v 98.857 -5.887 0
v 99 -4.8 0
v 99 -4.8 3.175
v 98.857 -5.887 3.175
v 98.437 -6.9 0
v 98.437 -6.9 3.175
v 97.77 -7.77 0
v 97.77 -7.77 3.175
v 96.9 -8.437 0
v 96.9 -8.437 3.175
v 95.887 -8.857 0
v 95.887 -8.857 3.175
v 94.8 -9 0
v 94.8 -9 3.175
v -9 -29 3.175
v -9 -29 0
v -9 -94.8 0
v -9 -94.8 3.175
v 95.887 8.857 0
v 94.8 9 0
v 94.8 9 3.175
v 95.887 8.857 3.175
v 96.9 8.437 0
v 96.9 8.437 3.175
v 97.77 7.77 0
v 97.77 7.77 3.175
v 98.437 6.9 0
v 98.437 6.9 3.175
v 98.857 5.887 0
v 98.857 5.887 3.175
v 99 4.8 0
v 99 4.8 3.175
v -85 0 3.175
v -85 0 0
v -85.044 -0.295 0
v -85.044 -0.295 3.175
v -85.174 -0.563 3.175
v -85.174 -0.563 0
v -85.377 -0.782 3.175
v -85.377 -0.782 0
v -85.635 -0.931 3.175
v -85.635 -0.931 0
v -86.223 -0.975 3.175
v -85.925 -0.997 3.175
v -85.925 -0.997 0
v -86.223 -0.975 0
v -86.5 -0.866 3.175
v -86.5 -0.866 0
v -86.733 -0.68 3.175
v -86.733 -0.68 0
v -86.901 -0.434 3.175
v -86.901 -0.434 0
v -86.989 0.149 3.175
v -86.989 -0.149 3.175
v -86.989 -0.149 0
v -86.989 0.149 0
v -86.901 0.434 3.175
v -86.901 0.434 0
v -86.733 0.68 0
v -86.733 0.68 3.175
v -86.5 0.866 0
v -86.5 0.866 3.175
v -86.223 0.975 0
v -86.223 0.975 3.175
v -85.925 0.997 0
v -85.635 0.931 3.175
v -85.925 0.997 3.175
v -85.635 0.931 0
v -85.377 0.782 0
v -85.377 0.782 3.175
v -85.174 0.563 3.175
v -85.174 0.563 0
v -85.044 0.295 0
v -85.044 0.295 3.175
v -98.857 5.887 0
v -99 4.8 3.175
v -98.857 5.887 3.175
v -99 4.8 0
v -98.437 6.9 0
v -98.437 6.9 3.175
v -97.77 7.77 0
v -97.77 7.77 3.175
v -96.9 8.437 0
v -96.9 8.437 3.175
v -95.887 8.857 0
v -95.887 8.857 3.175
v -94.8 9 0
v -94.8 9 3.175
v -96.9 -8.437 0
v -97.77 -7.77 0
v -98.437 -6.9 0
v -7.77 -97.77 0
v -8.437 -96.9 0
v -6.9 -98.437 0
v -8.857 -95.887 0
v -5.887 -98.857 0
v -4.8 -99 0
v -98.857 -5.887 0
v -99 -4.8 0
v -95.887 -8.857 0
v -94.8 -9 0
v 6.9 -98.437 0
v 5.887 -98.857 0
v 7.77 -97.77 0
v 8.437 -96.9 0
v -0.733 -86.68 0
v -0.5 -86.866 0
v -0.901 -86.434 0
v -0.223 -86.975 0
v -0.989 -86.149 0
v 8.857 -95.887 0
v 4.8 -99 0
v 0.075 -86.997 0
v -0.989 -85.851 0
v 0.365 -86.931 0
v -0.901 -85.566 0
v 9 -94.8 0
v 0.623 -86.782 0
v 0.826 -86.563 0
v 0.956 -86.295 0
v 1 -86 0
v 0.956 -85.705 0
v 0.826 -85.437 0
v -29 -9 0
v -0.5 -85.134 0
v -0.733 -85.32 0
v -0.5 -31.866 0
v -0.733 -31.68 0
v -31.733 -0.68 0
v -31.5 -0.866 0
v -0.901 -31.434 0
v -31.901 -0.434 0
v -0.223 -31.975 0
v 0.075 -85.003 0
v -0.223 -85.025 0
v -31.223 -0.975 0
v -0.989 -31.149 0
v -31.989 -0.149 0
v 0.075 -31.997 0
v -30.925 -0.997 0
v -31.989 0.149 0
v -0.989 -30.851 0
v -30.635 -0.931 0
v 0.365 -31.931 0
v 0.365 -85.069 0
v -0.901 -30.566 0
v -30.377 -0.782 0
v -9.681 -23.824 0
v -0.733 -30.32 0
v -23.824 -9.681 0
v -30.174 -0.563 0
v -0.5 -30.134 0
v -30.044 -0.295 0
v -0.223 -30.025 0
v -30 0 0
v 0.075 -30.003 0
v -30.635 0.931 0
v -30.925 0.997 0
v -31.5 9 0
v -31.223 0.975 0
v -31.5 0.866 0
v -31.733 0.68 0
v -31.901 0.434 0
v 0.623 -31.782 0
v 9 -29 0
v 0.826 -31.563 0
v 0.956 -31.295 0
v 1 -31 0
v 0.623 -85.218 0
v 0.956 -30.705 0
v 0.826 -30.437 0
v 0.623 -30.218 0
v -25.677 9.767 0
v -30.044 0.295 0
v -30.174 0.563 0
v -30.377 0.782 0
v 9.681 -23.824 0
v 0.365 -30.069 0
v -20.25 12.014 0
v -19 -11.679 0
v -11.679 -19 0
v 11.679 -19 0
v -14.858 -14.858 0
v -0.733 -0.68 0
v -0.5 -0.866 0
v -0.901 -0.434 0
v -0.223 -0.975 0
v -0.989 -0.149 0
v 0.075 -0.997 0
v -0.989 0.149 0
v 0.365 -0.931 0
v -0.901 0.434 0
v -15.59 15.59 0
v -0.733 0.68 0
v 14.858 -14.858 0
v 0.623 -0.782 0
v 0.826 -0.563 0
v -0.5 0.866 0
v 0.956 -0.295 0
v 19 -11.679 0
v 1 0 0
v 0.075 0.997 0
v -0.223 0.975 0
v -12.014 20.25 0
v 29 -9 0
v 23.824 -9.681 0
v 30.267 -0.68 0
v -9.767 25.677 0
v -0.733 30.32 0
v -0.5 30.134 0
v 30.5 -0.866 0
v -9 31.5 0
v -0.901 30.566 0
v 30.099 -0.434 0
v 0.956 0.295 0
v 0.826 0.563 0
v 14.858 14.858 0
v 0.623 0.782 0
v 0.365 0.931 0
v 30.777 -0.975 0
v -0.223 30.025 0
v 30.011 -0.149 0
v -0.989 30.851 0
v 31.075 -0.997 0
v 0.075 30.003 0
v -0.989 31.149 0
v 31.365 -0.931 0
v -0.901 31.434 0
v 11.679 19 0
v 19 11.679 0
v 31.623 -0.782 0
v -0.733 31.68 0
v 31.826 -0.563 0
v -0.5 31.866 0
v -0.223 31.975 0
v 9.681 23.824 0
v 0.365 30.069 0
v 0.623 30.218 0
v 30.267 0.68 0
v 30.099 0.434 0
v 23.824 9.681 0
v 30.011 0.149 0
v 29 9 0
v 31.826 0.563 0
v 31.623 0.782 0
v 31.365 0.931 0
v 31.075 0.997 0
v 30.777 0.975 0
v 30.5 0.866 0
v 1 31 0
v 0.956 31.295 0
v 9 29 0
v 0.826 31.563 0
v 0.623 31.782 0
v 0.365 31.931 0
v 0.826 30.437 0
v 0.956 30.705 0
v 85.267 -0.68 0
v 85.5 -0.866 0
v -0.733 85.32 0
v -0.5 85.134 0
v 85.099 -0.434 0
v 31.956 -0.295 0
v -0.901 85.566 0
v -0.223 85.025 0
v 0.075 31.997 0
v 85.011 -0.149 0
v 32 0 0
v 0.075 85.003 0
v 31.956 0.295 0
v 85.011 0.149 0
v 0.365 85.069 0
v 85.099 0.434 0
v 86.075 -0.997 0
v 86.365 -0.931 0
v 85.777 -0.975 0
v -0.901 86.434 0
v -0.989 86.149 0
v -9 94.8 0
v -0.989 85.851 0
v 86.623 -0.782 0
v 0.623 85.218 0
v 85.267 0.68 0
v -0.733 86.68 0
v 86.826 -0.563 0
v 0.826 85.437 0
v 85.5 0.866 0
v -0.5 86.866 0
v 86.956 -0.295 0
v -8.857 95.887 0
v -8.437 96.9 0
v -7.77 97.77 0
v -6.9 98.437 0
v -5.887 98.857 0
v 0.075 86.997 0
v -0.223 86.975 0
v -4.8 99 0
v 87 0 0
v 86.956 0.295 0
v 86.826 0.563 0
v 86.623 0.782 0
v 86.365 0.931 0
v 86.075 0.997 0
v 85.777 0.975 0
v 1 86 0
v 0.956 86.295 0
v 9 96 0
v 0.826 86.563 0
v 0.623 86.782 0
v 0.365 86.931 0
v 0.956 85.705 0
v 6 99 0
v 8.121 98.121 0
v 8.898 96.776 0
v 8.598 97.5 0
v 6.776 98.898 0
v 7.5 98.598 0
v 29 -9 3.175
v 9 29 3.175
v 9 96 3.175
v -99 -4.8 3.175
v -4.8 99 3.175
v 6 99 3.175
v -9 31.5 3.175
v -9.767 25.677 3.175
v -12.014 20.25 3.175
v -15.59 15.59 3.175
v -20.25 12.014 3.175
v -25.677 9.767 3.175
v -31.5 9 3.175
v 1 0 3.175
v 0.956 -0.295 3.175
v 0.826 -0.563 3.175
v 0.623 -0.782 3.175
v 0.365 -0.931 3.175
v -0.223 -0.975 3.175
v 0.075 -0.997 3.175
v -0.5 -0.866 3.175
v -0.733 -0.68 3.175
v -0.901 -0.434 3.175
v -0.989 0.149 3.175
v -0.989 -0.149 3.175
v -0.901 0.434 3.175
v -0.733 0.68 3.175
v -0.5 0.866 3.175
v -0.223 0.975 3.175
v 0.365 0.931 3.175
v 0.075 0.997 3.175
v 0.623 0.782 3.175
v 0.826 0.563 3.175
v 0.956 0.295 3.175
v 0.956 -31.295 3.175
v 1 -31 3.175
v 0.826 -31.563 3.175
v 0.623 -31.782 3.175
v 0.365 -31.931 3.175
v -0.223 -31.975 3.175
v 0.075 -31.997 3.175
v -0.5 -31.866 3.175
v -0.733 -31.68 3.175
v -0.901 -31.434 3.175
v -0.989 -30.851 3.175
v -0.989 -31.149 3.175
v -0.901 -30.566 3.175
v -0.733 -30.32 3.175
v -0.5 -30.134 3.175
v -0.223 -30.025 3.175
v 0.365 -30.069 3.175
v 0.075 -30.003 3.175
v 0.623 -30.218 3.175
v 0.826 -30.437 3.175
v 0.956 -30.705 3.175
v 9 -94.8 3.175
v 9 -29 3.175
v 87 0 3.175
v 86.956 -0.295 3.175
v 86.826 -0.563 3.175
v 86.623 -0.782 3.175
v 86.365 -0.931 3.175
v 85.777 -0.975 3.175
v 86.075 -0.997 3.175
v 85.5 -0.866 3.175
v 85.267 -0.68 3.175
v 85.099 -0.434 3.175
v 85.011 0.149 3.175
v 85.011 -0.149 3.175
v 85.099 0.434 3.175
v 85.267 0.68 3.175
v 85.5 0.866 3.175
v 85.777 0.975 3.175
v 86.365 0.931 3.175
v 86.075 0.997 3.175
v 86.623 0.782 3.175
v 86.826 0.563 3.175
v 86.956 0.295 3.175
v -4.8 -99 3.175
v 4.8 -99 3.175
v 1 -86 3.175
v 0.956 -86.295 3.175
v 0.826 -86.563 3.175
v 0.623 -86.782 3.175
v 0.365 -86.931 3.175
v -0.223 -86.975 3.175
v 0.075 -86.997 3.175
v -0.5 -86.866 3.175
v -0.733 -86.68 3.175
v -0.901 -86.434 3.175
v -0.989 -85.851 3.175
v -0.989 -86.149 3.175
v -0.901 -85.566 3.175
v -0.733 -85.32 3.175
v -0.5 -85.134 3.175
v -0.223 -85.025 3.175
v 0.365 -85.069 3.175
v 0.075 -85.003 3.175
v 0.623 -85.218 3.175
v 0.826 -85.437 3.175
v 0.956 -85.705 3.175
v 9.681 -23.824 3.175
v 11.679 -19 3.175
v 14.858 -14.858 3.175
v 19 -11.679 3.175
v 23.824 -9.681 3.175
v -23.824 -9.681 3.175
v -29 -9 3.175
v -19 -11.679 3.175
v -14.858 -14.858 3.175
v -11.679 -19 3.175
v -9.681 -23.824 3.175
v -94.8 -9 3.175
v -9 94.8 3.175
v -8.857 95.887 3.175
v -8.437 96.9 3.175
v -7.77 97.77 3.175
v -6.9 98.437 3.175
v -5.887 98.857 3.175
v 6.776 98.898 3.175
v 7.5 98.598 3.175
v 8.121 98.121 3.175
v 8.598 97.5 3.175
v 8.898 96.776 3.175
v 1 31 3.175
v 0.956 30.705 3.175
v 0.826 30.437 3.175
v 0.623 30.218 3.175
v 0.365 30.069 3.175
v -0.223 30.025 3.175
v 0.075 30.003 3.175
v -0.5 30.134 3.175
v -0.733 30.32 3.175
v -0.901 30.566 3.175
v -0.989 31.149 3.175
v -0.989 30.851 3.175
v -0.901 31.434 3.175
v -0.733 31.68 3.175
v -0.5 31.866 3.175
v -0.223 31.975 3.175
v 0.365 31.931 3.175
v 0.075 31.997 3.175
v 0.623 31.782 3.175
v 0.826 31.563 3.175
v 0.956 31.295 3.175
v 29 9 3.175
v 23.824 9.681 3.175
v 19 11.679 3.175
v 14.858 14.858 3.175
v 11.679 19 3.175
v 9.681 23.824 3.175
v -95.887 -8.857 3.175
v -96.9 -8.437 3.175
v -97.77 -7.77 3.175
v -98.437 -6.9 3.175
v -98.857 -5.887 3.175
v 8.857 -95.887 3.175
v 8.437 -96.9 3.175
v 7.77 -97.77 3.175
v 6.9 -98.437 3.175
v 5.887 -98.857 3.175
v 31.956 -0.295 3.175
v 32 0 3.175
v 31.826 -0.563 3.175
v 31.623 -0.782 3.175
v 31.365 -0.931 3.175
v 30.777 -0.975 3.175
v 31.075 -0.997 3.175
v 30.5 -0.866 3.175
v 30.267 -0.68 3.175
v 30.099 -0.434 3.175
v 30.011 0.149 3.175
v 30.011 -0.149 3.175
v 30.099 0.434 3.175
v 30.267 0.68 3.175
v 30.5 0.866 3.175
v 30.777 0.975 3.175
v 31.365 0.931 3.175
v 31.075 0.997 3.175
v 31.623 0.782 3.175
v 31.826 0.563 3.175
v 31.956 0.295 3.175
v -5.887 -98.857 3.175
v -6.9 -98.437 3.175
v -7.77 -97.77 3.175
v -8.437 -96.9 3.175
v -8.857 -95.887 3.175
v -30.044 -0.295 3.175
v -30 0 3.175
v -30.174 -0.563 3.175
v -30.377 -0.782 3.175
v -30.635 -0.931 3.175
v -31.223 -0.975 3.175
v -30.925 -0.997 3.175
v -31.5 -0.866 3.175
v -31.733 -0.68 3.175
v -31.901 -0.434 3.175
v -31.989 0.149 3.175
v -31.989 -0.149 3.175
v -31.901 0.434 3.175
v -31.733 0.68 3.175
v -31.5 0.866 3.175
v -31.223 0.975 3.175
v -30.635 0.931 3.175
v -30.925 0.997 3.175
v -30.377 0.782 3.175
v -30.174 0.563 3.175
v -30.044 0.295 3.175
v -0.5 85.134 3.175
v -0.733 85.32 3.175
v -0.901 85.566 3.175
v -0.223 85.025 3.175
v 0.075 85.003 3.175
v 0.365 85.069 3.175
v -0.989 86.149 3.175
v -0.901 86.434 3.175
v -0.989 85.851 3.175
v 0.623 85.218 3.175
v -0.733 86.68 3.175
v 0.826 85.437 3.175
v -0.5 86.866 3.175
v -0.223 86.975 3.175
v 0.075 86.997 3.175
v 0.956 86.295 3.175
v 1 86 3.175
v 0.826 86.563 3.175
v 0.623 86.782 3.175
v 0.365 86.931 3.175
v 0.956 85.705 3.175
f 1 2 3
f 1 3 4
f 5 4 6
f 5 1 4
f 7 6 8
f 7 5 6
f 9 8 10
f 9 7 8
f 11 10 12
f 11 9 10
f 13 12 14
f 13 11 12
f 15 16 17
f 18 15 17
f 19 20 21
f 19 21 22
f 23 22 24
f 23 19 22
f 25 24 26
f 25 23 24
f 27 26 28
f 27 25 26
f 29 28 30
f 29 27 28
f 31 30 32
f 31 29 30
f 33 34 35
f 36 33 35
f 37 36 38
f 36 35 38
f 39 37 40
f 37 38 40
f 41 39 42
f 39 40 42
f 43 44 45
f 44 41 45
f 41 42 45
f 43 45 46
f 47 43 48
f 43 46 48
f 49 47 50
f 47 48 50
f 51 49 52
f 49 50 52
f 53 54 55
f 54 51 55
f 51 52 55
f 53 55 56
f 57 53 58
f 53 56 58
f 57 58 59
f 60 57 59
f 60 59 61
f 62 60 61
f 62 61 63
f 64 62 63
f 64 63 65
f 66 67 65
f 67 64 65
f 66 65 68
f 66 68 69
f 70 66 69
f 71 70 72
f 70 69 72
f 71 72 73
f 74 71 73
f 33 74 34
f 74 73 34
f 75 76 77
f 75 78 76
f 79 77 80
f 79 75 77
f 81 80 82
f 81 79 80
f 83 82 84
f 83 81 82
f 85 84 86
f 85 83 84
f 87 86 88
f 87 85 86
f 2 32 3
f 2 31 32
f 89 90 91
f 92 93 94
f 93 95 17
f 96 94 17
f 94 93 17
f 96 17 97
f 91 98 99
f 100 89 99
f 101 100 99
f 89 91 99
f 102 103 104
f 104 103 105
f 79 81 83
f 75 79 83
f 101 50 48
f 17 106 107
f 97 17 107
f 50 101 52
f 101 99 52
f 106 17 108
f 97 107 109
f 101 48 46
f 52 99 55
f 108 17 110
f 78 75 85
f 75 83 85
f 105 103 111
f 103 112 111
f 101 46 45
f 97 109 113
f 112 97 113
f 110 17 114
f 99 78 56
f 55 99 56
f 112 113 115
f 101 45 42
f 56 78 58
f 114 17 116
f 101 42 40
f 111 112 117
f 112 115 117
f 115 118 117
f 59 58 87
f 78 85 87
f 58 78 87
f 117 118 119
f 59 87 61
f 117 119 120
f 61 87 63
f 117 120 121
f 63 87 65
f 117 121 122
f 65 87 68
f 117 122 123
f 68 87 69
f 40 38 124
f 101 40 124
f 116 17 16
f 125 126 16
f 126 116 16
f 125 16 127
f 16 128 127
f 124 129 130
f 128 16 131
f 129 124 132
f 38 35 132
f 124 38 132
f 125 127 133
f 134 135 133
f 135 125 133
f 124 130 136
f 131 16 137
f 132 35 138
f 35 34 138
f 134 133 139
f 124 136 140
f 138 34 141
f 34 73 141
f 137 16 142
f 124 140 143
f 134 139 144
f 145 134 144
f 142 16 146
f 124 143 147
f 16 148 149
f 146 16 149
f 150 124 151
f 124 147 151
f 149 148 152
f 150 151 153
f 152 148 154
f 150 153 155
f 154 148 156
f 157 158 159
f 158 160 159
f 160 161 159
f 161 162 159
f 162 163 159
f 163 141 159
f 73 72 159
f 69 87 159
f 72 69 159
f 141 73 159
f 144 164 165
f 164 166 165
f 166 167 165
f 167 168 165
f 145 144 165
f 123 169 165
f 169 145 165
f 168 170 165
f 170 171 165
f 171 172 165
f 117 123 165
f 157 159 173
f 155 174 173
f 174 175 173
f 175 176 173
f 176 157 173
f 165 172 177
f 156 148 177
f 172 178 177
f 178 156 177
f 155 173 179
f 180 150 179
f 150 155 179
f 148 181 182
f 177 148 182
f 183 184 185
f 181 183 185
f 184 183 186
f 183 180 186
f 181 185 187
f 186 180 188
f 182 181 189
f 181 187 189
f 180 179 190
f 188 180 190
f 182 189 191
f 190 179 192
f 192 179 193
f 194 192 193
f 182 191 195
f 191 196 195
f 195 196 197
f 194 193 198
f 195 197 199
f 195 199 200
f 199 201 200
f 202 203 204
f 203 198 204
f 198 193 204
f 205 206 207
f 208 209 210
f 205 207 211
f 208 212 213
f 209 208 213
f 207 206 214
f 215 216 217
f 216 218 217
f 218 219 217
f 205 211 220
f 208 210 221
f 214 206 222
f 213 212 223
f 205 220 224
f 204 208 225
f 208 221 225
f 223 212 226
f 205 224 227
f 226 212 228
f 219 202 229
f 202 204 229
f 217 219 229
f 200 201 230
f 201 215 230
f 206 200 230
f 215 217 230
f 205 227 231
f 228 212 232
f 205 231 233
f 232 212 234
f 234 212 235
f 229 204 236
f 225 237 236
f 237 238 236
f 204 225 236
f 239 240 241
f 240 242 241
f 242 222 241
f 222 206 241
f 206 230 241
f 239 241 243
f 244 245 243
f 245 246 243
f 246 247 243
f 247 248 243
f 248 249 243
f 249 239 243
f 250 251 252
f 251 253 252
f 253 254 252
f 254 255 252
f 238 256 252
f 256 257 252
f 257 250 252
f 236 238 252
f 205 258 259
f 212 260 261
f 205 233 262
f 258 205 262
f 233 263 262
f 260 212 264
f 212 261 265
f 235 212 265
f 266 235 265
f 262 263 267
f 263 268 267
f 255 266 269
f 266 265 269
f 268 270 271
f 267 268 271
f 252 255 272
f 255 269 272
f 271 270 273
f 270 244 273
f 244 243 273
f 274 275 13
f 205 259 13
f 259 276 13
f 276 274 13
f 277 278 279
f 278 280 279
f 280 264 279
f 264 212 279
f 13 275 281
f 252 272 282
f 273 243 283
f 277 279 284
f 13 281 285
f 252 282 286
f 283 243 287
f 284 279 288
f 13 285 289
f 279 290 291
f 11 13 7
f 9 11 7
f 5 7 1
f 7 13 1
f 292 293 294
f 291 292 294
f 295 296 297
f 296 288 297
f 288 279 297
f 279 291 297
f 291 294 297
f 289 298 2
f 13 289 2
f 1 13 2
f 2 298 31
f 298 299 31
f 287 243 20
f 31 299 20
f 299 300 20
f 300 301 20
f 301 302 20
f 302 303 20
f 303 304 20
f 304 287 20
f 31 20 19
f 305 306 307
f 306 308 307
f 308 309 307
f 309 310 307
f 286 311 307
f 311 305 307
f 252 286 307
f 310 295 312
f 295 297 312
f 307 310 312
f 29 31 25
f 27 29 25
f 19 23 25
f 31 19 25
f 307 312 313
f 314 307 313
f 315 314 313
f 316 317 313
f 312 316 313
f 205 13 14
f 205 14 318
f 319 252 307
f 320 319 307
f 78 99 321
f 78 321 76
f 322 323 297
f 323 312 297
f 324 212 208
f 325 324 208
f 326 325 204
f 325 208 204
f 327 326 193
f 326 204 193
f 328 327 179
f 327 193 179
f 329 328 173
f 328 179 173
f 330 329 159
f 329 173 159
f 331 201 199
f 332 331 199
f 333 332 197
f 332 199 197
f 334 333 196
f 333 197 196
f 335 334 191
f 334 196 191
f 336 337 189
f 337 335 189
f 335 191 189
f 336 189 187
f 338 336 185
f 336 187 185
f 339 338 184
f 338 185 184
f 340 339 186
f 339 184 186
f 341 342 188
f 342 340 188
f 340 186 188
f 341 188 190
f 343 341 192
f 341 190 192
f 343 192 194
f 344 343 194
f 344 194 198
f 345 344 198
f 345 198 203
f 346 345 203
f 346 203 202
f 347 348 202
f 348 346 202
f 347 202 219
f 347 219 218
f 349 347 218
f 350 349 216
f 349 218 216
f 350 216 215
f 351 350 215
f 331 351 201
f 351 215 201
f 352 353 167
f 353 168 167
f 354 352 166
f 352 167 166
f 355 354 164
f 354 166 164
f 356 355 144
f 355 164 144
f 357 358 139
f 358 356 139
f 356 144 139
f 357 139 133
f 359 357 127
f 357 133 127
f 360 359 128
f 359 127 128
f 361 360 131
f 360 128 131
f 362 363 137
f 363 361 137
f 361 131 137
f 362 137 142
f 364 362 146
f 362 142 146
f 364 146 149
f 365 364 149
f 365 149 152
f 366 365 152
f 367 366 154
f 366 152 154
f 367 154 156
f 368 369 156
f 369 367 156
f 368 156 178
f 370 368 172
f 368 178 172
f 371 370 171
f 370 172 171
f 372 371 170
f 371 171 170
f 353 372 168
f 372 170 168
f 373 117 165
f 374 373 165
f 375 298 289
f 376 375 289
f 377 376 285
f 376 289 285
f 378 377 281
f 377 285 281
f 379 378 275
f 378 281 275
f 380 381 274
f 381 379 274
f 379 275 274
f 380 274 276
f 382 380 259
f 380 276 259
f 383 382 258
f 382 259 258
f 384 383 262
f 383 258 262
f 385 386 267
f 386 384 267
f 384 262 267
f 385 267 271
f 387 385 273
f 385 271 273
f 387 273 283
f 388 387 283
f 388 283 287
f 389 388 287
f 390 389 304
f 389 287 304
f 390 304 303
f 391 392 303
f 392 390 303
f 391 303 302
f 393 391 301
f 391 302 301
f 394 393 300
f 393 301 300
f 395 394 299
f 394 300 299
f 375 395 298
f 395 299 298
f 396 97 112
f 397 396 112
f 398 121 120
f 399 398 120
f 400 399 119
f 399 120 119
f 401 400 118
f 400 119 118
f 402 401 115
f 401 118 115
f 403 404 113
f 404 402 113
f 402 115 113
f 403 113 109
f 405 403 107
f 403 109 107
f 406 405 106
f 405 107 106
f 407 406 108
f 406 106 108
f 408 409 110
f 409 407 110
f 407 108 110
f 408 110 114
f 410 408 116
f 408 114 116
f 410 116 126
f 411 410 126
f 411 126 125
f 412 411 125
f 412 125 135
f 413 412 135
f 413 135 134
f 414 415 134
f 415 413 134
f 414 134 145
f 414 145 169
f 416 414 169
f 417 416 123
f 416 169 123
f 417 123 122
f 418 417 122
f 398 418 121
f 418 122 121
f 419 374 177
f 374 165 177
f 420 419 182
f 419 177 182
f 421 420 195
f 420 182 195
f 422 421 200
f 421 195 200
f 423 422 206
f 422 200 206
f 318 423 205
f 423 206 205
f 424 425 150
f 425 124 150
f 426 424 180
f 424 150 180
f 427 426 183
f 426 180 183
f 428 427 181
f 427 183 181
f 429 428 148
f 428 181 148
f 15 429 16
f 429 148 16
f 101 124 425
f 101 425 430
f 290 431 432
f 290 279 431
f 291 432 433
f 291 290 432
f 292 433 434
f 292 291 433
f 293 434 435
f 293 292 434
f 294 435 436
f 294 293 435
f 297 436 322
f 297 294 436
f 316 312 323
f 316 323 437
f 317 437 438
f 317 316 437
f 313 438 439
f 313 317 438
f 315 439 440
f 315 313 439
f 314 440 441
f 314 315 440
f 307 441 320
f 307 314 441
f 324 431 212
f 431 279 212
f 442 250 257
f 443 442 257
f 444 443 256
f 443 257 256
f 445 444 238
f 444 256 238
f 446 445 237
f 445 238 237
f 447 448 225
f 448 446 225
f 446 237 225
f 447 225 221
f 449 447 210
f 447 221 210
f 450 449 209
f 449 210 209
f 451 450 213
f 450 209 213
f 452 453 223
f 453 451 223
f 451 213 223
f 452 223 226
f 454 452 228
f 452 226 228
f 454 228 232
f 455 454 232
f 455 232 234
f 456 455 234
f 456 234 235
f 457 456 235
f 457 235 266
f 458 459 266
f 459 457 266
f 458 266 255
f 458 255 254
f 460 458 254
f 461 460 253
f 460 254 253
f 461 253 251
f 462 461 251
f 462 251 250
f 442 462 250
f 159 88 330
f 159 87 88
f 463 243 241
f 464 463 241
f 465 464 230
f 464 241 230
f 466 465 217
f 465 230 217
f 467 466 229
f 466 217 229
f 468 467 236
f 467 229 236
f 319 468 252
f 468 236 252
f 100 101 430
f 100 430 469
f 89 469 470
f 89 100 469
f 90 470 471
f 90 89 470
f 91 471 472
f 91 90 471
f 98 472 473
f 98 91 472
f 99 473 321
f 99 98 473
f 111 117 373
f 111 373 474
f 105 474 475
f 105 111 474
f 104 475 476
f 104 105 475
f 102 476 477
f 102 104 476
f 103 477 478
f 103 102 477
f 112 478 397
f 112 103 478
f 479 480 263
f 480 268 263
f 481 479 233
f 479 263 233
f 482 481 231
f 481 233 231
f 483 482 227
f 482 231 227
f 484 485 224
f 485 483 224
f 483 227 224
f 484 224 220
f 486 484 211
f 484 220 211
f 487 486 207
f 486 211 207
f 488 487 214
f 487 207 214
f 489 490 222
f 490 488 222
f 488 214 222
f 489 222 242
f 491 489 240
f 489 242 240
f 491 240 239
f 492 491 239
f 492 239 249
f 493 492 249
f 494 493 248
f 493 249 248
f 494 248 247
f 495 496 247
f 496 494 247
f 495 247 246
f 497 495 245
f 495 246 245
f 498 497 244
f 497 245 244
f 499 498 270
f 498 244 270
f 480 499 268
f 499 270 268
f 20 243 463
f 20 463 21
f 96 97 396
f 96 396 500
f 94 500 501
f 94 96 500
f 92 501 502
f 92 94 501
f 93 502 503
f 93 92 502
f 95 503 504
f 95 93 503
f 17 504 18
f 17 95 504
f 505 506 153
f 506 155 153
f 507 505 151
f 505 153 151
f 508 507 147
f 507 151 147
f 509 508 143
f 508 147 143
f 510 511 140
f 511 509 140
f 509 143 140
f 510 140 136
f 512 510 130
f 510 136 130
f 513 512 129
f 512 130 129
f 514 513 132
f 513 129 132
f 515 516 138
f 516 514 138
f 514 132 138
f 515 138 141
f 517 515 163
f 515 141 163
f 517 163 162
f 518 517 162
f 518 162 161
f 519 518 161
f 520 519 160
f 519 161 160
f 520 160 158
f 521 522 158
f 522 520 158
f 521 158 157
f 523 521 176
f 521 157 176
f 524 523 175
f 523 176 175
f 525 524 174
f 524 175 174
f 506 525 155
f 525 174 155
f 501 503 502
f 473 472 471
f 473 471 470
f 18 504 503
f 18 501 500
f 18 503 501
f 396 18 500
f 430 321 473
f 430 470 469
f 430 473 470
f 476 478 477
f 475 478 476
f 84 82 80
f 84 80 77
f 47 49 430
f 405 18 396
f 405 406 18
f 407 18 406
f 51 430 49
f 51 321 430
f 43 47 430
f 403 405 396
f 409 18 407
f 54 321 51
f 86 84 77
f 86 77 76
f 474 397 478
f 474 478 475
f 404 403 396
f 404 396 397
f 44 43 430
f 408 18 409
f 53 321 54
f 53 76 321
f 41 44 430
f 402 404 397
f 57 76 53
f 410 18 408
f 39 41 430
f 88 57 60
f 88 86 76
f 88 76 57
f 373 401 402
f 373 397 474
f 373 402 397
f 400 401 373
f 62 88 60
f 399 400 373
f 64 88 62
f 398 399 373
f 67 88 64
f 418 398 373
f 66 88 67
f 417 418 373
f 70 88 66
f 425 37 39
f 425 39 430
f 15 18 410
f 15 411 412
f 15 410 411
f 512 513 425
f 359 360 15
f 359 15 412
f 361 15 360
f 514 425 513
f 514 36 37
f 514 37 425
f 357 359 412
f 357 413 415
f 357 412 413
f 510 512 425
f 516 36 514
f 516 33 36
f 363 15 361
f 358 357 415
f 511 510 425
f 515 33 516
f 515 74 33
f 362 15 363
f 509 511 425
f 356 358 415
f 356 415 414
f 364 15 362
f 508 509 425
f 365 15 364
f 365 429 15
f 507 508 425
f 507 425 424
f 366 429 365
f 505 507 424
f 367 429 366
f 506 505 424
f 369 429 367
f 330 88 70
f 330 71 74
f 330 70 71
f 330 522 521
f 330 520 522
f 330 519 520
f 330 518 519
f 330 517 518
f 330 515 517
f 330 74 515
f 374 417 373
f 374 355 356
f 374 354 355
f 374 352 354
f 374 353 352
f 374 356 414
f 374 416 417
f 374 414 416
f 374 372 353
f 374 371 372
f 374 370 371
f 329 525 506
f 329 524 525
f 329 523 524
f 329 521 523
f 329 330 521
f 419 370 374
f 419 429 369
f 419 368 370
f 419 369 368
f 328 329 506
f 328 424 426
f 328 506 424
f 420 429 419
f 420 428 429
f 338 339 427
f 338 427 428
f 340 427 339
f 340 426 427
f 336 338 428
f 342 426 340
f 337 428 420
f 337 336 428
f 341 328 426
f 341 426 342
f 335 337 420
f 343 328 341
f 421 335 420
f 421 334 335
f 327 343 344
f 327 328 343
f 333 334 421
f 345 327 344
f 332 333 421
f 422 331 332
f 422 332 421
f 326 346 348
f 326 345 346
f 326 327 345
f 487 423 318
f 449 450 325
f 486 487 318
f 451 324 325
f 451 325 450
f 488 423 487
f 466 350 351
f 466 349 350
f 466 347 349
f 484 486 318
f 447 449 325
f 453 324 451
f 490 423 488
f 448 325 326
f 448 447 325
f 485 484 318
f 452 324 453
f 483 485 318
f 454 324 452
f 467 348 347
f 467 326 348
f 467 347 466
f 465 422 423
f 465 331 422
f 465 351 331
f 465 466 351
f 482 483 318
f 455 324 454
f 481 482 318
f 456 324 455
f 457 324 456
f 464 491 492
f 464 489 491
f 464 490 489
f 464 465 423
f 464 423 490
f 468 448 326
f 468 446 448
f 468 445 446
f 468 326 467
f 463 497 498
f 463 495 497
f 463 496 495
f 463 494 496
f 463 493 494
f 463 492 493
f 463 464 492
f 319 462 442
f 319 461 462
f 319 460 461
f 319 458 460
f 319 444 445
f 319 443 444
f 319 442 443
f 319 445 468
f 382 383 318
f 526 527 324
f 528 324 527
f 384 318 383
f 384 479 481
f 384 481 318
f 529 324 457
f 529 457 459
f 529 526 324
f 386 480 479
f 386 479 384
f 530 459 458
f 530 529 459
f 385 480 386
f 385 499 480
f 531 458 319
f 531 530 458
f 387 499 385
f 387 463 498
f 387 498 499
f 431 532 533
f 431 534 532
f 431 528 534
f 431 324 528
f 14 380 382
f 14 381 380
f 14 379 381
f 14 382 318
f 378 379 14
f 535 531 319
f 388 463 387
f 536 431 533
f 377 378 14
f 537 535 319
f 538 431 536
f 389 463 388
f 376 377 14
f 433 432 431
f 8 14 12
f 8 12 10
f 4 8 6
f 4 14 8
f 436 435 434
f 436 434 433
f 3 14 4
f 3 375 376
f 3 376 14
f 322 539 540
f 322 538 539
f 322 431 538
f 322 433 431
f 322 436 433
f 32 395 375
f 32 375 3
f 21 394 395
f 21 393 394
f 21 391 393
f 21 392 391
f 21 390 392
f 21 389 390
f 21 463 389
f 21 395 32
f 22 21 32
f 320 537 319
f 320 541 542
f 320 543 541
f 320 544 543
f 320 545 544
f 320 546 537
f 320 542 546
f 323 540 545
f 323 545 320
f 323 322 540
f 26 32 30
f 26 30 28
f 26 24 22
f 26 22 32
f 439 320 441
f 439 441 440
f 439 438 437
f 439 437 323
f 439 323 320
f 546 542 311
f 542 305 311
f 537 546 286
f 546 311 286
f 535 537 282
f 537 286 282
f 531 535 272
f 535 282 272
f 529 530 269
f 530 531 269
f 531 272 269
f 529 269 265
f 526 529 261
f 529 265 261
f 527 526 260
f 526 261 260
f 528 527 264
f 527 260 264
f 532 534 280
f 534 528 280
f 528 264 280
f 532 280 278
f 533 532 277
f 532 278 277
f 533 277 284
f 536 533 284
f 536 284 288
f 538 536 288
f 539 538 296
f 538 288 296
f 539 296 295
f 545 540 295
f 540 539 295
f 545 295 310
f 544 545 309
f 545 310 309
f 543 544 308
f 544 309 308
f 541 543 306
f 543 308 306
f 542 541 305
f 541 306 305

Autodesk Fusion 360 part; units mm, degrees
sketch "Sketch1" plane through (0, 0, 0) normal (0, 0, 1) x (1, 0, 0)
  line L0 (99, 4.8) -> (99, -4.8)
  line L1 (-99, -4.8) -> (-99, 4.8)
  line L2 (-99, 9) -> (99, -9) construction
  line L3 (99, 9) -> (-99, -9) construction
  line L4 (6, 99) -> (-4.8, 99)
  line L5 (-4.8, -99) -> (4.8, -99)
  line L6 (9, 99) -> (-9, -99) construction
  line L7 (-9, 99) -> (9, -99) construction
  line L8 (-29, -9) -> (-94.8, -9)
  line L9 (94.8, -9) -> (29, -9)
  line L10 (0.8182, -9) -> (-0.8182, -9)
  line L11 (29, 9) -> (94.8, 9)
  line L12 (-94.8, 9) -> (-31.5, 9)
  line L13 (-0.8182, 9) -> (0.8182, 9)
  line L14 (-9, 94.8) -> (-9, 31.5)
  line L15 (-9, 0.8182) -> (-9, -0.8182)
  line L16 (-9, -29) -> (-9, -94.8)
  line L17 (9, -94.8) -> (9, -29)
  line L18 (9, 29) -> (9, 96)
  arc A0 (9, 29) -> (29, 9) centre (29, 29) ccw
  arc A1 (29, -9) -> (9, -29) centre (29, -29) ccw
  arc A2 (-9, -29) -> (-29, -9) centre (-29, -29) ccw
  arc A3 (-31.5, 9) -> (-9, 31.5) centre (-31.5, 31.5) ccw
  arc A4 (9, 96) -> (6, 99) centre (6, 96) ccw
  arc A5 (-4.8, 99) -> (-9, 94.8) centre (-4.8, 94.8) ccw
  arc A6 (-94.8, 9) -> (-99, 4.8) centre (-94.8, 4.8) ccw
  arc A7 (-99, -4.8) -> (-94.8, -9) centre (-94.8, -4.8) ccw
  arc A8 (99, 4.8) -> (94.8, 9) centre (94.8, 4.8) ccw
  arc A9 (94.8, -9) -> (99, -4.8) centre (94.8, -4.8) ccw
  arc A10 (-9, -94.8) -> (-4.8, -99) centre (-4.8, -94.8) ccw
  arc A11 (4.8, -99) -> (9, -94.8) centre (4.8, -94.8) ccw
  circle A12 centre (-86, 0) radius 1
  circle A13 centre (-31, 0) radius 1
  circle A14 centre (86, 0) radius 1
  circle A15 centre (31, 0) radius 1
  circle A16 centre (0, -86) radius 1
  circle A17 centre (0, -31) radius 1
  circle A18 centre (0, 86) radius 1
  circle A19 centre (0, 31) radius 1
  circle A20 centre (0, 0) radius 1
  dimension "d1" = 198
  dimension "d2" = 18
  dimension "d5" = 18
  dimension "d6" = 198
  dimension "d9" = 20
  dimension "d10" = 22.5
  dimension "d11" = 3
  dimension "d12" = 4.2
  dimension "d15" = 2
  dimension "d16" = 2
  dimension "d17" = 13
  dimension "d18" = 2
  dimension "d19" = 13
  dimension "d20" = 2
  dimension "d21" = 2
  dimension "d22" = 13
  dimension "d23" = 2
  dimension "d24" = 2
  dimension "d25" = 13
  dimension "d26" = 68
  dimension "d27" = 68
  dimension "d28" = 68
  dimension "d29" = 68
  dimension "d30" = 2
extrude "Extrude1" add sketch "Sketch1" along normal blind 3.175
equation "d1 = totalArmLenght"
equation "d2 = armWidth"
equation "totalArmLenght = 198 mm"
equation "armWidth = 18 mm"
equation "d5 = armWidth"
equation "d6 = totalArmLenght"
equation "tipBend = 13 mm"
equation "bottomBend = 68 mm"
equation "d17 = tipBend"
equation "d19 = tipBend"
equation "d22 = tipBend"
equation "d25 = tipBend"
equation "d26 = bottomBend"
equation "d27 = bottomBend"
equation "d28 = bottomBend"
equation "d29 = bottomBend"
